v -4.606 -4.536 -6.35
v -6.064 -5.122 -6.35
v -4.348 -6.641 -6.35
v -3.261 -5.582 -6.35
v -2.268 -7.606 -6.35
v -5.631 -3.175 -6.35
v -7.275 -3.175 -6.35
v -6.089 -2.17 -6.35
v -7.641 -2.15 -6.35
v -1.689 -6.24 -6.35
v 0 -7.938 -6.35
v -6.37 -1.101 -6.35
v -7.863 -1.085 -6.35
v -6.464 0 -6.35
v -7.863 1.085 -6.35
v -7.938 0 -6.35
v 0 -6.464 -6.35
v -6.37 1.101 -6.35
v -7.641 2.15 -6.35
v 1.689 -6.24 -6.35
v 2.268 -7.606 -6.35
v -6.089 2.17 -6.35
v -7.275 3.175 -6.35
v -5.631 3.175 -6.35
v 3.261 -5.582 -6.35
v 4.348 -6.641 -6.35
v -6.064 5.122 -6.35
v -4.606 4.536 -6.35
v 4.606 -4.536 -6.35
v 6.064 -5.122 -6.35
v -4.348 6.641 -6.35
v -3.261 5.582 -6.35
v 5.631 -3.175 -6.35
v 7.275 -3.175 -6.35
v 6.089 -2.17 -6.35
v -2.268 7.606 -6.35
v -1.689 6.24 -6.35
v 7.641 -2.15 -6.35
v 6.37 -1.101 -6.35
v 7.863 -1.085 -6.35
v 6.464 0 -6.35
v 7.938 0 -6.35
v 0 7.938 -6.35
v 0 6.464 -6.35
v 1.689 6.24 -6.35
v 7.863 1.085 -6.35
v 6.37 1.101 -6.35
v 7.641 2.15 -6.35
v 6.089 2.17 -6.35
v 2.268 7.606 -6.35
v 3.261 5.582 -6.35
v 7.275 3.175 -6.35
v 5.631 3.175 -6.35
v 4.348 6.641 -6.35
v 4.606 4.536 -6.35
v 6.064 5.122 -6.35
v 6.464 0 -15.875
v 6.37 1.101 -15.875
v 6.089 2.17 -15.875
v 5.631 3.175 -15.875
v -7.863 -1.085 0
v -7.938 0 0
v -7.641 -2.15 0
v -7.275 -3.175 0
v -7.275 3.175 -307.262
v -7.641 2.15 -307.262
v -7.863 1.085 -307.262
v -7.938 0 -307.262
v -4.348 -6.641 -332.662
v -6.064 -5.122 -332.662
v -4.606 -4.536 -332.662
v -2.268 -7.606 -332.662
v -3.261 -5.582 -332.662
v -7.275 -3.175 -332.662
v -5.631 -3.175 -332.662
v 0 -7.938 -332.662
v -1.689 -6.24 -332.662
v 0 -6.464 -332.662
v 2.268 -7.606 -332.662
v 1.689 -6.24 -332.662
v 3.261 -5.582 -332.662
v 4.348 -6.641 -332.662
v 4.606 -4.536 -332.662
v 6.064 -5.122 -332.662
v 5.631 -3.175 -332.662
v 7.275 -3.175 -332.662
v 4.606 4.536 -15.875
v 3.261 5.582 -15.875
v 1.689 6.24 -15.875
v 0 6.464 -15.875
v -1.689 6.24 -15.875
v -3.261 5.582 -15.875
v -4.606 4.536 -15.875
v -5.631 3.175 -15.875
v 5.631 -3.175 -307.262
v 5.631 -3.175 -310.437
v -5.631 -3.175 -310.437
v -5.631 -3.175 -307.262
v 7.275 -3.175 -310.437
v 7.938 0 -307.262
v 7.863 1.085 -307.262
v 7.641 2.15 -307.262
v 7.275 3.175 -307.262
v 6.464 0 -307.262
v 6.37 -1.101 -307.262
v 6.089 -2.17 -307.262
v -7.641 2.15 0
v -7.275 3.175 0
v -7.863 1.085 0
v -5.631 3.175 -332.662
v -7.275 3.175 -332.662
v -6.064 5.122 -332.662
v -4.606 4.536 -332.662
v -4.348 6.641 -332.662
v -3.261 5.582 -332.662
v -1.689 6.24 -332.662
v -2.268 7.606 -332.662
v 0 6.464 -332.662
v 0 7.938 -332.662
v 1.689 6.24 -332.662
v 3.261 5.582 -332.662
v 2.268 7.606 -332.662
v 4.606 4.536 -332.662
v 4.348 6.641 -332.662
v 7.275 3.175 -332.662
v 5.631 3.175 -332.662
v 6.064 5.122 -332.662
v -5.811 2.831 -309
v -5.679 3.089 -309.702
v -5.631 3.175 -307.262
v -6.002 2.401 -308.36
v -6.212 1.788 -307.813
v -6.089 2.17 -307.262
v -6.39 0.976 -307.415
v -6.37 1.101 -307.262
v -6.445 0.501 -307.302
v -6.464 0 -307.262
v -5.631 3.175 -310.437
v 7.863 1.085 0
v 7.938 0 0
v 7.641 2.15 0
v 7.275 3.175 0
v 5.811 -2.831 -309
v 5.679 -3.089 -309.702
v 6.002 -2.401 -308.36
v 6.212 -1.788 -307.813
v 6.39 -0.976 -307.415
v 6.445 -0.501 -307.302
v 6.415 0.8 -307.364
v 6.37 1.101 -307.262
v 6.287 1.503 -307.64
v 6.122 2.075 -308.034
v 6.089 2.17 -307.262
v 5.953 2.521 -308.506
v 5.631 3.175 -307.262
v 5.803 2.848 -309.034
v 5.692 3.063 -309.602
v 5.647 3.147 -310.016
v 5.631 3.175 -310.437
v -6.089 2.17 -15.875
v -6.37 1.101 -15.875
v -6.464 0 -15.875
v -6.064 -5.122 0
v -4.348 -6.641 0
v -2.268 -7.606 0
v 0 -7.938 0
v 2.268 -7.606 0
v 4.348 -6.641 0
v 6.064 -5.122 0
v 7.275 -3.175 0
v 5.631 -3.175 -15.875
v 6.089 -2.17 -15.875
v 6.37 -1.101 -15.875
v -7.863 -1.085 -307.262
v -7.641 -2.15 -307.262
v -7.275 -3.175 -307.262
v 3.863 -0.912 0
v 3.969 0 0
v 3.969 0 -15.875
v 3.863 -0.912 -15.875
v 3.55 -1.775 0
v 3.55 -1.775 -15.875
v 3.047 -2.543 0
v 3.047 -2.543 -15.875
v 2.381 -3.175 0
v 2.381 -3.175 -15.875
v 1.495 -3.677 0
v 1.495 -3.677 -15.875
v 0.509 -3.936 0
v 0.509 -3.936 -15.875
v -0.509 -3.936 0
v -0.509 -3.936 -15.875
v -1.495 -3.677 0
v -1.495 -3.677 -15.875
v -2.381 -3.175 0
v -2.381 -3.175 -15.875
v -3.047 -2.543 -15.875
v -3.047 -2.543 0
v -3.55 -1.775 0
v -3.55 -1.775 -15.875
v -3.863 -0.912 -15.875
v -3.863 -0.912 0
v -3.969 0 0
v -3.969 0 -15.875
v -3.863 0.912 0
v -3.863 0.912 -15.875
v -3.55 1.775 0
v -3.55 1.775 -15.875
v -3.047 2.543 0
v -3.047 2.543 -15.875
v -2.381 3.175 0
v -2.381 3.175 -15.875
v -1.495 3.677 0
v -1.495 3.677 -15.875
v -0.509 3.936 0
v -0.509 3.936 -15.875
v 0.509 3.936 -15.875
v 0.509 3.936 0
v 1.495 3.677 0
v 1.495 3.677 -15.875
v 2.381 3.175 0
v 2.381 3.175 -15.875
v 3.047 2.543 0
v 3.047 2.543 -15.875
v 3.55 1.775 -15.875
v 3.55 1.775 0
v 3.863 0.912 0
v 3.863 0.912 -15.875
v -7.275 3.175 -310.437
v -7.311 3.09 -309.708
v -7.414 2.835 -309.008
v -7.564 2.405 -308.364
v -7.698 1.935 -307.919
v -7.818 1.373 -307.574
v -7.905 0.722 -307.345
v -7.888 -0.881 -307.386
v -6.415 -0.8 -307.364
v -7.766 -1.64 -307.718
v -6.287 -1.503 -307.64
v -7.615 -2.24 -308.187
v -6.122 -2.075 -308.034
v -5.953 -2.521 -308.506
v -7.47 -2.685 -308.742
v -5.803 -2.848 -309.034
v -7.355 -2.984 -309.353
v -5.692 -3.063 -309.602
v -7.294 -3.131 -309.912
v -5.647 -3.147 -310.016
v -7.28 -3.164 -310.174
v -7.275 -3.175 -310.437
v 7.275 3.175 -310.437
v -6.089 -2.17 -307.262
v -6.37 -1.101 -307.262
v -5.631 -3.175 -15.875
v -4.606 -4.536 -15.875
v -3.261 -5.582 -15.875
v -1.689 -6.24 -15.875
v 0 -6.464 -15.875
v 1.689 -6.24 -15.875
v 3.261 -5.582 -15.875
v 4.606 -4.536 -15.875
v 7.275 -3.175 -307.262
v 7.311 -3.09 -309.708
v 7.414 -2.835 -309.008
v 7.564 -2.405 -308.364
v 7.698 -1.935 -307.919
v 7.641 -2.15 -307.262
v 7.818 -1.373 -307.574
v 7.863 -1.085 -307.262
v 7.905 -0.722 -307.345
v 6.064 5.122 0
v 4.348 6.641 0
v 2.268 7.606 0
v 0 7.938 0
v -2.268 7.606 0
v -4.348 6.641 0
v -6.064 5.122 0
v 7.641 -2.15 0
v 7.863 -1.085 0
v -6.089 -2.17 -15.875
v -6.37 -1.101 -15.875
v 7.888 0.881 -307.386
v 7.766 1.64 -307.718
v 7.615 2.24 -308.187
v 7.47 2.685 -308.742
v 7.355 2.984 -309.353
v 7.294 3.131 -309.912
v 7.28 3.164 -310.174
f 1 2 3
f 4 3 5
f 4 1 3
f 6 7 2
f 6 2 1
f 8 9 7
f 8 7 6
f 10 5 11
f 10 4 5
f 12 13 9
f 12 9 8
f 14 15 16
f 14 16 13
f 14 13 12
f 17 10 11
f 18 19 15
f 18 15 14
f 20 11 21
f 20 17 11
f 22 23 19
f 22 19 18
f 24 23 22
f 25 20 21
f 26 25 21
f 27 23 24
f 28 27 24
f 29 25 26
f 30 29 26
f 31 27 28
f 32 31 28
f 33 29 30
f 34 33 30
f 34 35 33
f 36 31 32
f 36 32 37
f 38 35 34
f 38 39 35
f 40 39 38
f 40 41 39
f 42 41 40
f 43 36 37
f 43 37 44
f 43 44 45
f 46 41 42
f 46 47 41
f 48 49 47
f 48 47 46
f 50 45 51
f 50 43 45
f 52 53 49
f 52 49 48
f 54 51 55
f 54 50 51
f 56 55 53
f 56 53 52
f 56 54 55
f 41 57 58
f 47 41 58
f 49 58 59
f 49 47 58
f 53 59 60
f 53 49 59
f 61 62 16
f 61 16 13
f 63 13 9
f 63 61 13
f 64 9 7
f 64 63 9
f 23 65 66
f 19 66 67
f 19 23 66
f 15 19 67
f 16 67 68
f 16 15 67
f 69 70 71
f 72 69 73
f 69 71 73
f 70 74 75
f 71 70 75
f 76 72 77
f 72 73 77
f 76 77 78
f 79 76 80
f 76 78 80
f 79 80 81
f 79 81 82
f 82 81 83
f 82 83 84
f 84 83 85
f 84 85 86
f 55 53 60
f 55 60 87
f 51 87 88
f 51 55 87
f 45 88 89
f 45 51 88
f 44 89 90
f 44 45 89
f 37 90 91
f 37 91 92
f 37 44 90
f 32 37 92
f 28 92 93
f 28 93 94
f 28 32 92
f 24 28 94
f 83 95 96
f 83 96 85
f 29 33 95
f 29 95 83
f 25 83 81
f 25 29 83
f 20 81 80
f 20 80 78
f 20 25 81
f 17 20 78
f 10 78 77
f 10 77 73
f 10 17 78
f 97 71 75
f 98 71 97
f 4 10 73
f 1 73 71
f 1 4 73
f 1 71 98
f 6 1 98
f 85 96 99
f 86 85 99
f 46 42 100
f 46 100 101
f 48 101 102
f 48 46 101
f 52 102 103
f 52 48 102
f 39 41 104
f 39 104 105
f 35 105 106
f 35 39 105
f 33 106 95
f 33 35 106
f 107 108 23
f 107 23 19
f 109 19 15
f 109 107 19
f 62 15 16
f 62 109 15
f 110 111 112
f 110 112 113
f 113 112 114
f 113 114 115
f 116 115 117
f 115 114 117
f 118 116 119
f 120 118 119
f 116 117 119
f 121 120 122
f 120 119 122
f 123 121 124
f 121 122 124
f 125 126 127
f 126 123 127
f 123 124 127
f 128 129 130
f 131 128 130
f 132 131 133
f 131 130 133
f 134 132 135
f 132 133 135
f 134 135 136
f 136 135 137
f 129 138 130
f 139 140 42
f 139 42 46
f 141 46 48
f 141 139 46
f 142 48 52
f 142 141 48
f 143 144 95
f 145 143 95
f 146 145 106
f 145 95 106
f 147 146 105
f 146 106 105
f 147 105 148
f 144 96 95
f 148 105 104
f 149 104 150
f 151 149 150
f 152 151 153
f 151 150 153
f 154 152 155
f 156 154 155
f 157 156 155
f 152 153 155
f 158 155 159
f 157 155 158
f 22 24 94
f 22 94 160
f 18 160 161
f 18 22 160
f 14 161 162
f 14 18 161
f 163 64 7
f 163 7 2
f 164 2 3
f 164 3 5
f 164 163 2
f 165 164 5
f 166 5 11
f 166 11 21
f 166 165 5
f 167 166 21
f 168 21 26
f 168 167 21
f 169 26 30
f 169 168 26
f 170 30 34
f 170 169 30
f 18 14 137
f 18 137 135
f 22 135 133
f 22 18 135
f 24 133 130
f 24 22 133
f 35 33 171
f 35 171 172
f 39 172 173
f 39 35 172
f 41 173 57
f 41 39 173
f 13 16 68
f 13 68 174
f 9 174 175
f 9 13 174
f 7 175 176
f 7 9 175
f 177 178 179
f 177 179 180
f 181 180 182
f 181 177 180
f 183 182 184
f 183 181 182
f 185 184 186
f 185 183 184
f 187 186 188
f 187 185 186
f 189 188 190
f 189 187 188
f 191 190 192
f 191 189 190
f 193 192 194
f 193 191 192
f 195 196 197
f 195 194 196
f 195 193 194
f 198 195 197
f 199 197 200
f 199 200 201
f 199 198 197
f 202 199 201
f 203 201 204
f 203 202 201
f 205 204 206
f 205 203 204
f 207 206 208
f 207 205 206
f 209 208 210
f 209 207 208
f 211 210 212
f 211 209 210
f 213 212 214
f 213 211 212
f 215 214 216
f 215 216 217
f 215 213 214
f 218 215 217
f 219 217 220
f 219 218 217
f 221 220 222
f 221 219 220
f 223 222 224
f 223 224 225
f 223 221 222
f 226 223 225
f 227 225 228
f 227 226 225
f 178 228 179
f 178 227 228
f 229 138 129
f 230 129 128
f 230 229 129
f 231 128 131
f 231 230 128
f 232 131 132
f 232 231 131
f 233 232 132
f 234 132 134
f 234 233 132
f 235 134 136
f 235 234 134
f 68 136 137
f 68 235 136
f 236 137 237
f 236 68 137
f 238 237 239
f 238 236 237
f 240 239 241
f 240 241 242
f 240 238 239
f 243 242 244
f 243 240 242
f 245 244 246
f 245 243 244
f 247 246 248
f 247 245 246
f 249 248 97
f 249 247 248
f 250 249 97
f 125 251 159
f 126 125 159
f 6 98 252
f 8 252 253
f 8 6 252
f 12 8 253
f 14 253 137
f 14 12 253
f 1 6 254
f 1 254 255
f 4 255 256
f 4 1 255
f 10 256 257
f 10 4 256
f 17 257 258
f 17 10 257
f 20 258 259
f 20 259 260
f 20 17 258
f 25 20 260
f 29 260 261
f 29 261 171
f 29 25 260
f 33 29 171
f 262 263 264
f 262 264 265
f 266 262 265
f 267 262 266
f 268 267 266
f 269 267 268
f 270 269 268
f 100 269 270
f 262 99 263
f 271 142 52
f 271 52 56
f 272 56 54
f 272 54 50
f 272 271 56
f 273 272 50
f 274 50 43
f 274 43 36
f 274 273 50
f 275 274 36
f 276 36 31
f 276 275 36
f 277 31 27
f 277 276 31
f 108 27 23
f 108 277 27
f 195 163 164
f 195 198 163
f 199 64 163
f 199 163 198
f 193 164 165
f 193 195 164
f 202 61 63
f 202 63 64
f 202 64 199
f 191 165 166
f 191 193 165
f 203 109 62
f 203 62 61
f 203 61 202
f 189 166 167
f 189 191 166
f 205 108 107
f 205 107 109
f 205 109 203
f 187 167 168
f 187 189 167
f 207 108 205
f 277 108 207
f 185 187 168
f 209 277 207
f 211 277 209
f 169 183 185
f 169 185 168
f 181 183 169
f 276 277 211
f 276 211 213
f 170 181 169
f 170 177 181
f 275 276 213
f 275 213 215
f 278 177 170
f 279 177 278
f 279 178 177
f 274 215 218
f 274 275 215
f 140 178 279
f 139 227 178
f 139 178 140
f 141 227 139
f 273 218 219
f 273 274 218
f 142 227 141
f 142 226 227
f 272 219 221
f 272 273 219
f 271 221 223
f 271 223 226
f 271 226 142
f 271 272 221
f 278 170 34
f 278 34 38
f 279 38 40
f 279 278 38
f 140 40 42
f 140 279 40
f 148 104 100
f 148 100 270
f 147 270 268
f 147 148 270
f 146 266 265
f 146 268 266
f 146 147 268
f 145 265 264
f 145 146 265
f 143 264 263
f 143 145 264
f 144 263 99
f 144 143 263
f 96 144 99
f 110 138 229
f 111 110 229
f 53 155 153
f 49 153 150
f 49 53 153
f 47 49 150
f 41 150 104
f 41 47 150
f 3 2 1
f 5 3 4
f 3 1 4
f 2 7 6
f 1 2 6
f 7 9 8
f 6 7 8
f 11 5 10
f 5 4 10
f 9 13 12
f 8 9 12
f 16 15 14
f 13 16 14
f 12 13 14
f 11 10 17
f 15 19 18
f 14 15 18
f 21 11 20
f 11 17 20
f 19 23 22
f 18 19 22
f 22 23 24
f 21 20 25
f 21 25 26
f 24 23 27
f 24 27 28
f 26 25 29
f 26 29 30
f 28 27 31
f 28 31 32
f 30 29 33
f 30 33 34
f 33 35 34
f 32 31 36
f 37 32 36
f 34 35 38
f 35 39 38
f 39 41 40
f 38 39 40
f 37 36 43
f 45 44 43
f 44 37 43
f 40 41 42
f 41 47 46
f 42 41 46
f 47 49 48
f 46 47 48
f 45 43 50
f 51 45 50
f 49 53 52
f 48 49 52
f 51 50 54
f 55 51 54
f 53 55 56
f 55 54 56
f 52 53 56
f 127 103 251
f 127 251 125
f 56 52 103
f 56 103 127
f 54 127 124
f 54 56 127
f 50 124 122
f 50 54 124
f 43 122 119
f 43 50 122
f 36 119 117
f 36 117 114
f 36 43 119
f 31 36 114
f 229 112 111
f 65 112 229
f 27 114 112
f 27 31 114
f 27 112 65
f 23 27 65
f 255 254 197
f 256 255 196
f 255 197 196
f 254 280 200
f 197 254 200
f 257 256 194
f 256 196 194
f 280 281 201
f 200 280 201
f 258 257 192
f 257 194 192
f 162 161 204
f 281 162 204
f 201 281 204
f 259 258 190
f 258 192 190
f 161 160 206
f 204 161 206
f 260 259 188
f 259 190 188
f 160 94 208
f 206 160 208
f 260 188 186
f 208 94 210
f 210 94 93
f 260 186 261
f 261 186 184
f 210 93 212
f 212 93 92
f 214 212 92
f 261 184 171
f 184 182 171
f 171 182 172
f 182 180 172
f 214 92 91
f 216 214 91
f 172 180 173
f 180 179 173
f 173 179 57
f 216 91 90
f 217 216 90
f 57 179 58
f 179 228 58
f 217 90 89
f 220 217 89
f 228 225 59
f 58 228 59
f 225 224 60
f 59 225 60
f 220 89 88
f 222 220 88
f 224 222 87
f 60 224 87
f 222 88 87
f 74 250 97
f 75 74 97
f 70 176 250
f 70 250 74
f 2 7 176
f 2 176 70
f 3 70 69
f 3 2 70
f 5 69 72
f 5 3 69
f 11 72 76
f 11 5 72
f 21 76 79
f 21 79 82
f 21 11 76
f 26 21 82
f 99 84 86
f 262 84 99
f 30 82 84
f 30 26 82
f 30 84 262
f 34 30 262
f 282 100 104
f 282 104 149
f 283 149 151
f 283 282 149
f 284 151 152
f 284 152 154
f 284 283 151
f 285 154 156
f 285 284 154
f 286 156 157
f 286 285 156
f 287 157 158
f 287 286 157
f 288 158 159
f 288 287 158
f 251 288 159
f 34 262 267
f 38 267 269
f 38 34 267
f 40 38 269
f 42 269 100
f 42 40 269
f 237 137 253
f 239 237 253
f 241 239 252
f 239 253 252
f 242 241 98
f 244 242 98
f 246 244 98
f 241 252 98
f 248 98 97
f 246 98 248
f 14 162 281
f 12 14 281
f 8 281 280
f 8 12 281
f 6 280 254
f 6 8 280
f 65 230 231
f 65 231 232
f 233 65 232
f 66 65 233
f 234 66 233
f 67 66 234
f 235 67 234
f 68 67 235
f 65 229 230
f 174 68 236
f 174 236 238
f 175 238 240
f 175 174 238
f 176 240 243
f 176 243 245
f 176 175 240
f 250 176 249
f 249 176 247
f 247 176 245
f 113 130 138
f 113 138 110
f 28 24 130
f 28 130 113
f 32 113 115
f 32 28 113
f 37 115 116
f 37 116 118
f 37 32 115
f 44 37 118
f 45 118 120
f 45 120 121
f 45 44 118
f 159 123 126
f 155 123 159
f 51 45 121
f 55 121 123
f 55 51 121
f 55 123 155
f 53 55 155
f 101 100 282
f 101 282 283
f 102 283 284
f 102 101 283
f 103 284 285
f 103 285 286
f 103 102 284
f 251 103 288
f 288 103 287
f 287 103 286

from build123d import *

# Parameters (mm, degrees)
THREADED_INSERT_1_1_DEPTH = 6.35
THREADED_START            = -6.35
THREADED_INSERT_1_2_DEPTH = 9.525
A_ARM_START               = -6.35
A_ARM_TUBE_DEPTH          = 326.311725
APEX_START                = -307.261725
APEX_SLOT_DEPTH           = 25.4
FILLET1_R                 = 3.175


with BuildPart() as part:
    # Sketch1 → Threaded insert 1-1 (new body)
    with BuildSketch(Plane.XY):
        with BuildLine():
            ThreePointArc((-2.38125, 3.175), (0, 3.96875), (2.38125, 3.175))
            Line((2.38125, 3.175), (5.630856905, 3.175))
            ThreePointArc((5.630856905, 3.175), (0, 6.4643), (-5.630856905, 3.175))
            Line((-5.630856905, 3.175), (-2.38125, 3.175))
        make_face()
        with BuildLine():
            ThreePointArc((-5.630856905, 3.175), (0, 6.4643), (5.630856905, 3.175))
            Line((5.630856905, 3.175), (7.274838916, 3.175))
            ThreePointArc((7.274838916, 3.175), (0, 7.9375), (-7.274838916, 3.175))
            Line((-7.274838916, 3.175), (-5.630856905, 3.175))
        make_face()
        with BuildLine():
            ThreePointArc((2.38125, 3.175), (3.549757914, 1.774878957), (3.96875, 0))
            Line((3.96875, 0), (6.4643, 0))
            ThreePointArc((6.4643, 0), (6.252468424, 1.641283978), (5.630856905, 3.175))
            Line((5.630856905, 3.175), (2.38125, 3.175))
        make_face()
        with BuildLine():
            Line((-6.4643, 0), (-3.96875, 0))
            ThreePointArc((-3.96875, 0), (-3.549757914, 1.774878957), (-2.38125, 3.175))
            Line((-2.38125, 3.175), (-5.630856905, 3.175))
            ThreePointArc((-5.630856905, 3.175), (-6.252468424, 1.641283978), (-6.4643, 0))
        make_face()
        with BuildLine():
            ThreePointArc((5.630856905, 3.175), (6.252468424, 1.641283978), (6.4643, 0))
            Line((6.4643, 0), (7.9375, 0))
            ThreePointArc((7.9375, 0), (7.770068859, 1.621707797), (7.274838916, 3.175))
            Line((7.274838916, 3.175), (5.630856905, 3.175))
        make_face()
        with BuildLine():
            Line((-7.9375, 0), (-6.4643, 0))
            ThreePointArc((-6.4643, 0), (-6.252468424, 1.641283978), (-5.630856905, 3.175))
            Line((-5.630856905, 3.175), (-7.274838916, 3.175))
            ThreePointArc((-7.274838916, 3.175), (-7.770068859, 1.621707797), (-7.9375, 0))
        make_face()
        with BuildLine():
            Line((7.9375, 0), (6.4643, 0))
            ThreePointArc((6.4643, 0), (6.252468424, -1.641283978), (5.630856905, -3.175))
            Line((5.630856905, -3.175), (7.274838916, -3.175))
            ThreePointArc((7.274838916, -3.175), (7.770068859, -1.621707797), (7.9375, 0))
        make_face()
        with BuildLine():
            ThreePointArc((-5.630856905, -3.175), (-6.252468424, -1.641283978), (-6.4643, 0))
            Line((-6.4643, 0), (-7.9375, 0))
            ThreePointArc((-7.9375, 0), (-7.770068859, -1.621707797), (-7.274838916, -3.175))
            Line((-7.274838916, -3.175), (-5.630856905, -3.175))
        make_face()
        with BuildLine():
            Line((6.4643, 0), (3.96875, 0))
            ThreePointArc((3.96875, 0), (3.549757914, -1.774878957), (2.38125, -3.175))
            Line((2.38125, -3.175), (5.630856905, -3.175))
            ThreePointArc((5.630856905, -3.175), (6.252468424, -1.641283978), (6.4643, 0))
        make_face()
        with BuildLine():
            ThreePointArc((-2.38125, -3.175), (-3.549757914, -1.774878957), (-3.96875, 0))
            Line((-3.96875, 0), (-6.4643, 0))
            ThreePointArc((-6.4643, 0), (-6.252468424, -1.641283978), (-5.630856905, -3.175))
            Line((-5.630856905, -3.175), (-2.38125, -3.175))
        make_face()
        with BuildLine():
            Line((5.630856905, -3.175), (2.38125, -3.175))
            ThreePointArc((2.38125, -3.175), (0, -3.96875), (-2.38125, -3.175))
            Line((-2.38125, -3.175), (-5.630856905, -3.175))
            ThreePointArc((-5.630856905, -3.175), (0, -6.4643), (5.630856905, -3.175))
        make_face()
        with BuildLine():
            Line((7.274838916, -3.175), (5.630856905, -3.175))
            ThreePointArc((5.630856905, -3.175), (0, -6.4643), (-5.630856905, -3.175))
            Line((-5.630856905, -3.175), (-7.274838916, -3.175))
            ThreePointArc((-7.274838916, -3.175), (0, -7.9375), (7.274838916, -3.175))
        make_face()
    extrude(amount=-THREADED_INSERT_1_1_DEPTH)

    # Sketch1<3> → Threaded insert 1-2 (add)
    with BuildSketch(Plane.XY.offset(THREADED_START)):
        with BuildLine():
            ThreePointArc((-2.38125, 3.175), (0, 3.96875), (2.38125, 3.175))
            Line((2.38125, 3.175), (5.630856905, 3.175))
            ThreePointArc((5.630856905, 3.175), (0, 6.4643), (-5.630856905, 3.175))
            Line((-5.630856905, 3.175), (-2.38125, 3.175))
        make_face()
        with BuildLine():
            ThreePointArc((2.38125, 3.175), (3.549757914, 1.774878957), (3.96875, 0))
            Line((3.96875, 0), (6.4643, 0))
            ThreePointArc((6.4643, 0), (6.252468424, 1.641283978), (5.630856905, 3.175))
            Line((5.630856905, 3.175), (2.38125, 3.175))
        make_face()
        with BuildLine():
            Line((-6.4643, 0), (-3.96875, 0))
            ThreePointArc((-3.96875, 0), (-3.549757914, 1.774878957), (-2.38125, 3.175))
            Line((-2.38125, 3.175), (-5.630856905, 3.175))
            ThreePointArc((-5.630856905, 3.175), (-6.252468424, 1.641283978), (-6.4643, 0))
        make_face()
        with BuildLine():
            Line((6.4643, 0), (3.96875, 0))
            ThreePointArc((3.96875, 0), (3.549757914, -1.774878957), (2.38125, -3.175))
            Line((2.38125, -3.175), (5.630856905, -3.175))
            ThreePointArc((5.630856905, -3.175), (6.252468424, -1.641283978), (6.4643, 0))
        make_face()
        with BuildLine():
            ThreePointArc((-2.38125, -3.175), (-3.549757914, -1.774878957), (-3.96875, 0))
            Line((-3.96875, 0), (-6.4643, 0))
            ThreePointArc((-6.4643, 0), (-6.252468424, -1.641283978), (-5.630856905, -3.175))
            Line((-5.630856905, -3.175), (-2.38125, -3.175))
        make_face()
        with BuildLine():
            Line((5.630856905, -3.175), (2.38125, -3.175))
            ThreePointArc((2.38125, -3.175), (0, -3.96875), (-2.38125, -3.175))
            Line((-2.38125, -3.175), (-5.630856905, -3.175))
            ThreePointArc((-5.630856905, -3.175), (0, -6.4643), (5.630856905, -3.175))
        make_face()
    extrude(amount=-THREADED_INSERT_1_2_DEPTH)


with BuildPart() as body_2:
    # Sketch1<4> → A-arm tube (new body)
    with BuildSketch(Plane.XY.offset(A_ARM_START)):
        with BuildLine():
            ThreePointArc((-5.630856905, 3.175), (0, 6.4643), (5.630856905, 3.175))
            Line((5.630856905, 3.175), (7.274838916, 3.175))
            ThreePointArc((7.274838916, 3.175), (0, 7.9375), (-7.274838916, 3.175))
            Line((-7.274838916, 3.175), (-5.630856905, 3.175))
        make_face()
        with BuildLine():
            ThreePointArc((5.630856905, 3.175), (6.252468424, 1.641283978), (6.4643, 0))
            Line((6.4643, 0), (7.9375, 0))
            ThreePointArc((7.9375, 0), (7.770068859, 1.621707797), (7.274838916, 3.175))
            Line((7.274838916, 3.175), (5.630856905, 3.175))
        make_face()
        with BuildLine():
            Line((-7.9375, 0), (-6.4643, 0))
            ThreePointArc((-6.4643, 0), (-6.252468424, 1.641283978), (-5.630856905, 3.175))
            Line((-5.630856905, 3.175), (-7.274838916, 3.175))
            ThreePointArc((-7.274838916, 3.175), (-7.770068859, 1.621707797), (-7.9375, 0))
        make_face()
        with BuildLine():
            Line((7.9375, 0), (6.4643, 0))
            ThreePointArc((6.4643, 0), (6.252468424, -1.641283978), (5.630856905, -3.175))
            Line((5.630856905, -3.175), (7.274838916, -3.175))
            ThreePointArc((7.274838916, -3.175), (7.770068859, -1.621707797), (7.9375, 0))
        make_face()
        with BuildLine():
            ThreePointArc((-5.630856905, -3.175), (-6.252468424, -1.641283978), (-6.4643, 0))
            Line((-6.4643, 0), (-7.9375, 0))
            ThreePointArc((-7.9375, 0), (-7.770068859, -1.621707797), (-7.274838916, -3.175))
            Line((-7.274838916, -3.175), (-5.630856905, -3.175))
        make_face()
        with BuildLine():
            Line((7.274838916, -3.175), (5.630856905, -3.175))
            ThreePointArc((5.630856905, -3.175), (0, -6.4643), (-5.630856905, -3.175))
            Line((-5.630856905, -3.175), (-7.274838916, -3.175))
            ThreePointArc((-7.274838916, -3.175), (0, -7.9375), (7.274838916, -3.175))
        make_face()
    extrude(amount=-A_ARM_TUBE_DEPTH)

    # Sketch1<5> → Apex slot (cut)
    with BuildSketch(Plane.XY.offset(APEX_START)):
        with BuildLine():
            ThreePointArc((5.630856905, 3.175), (6.252468424, 1.641283978), (6.4643, 0))
            Line((6.4643, 0), (7.9375, 0))
            ThreePointArc((7.9375, 0), (7.770068859, 1.621707797), (7.274838916, 3.175))
            Line((7.274838916, 3.175), (5.630856905, 3.175))
        make_face()
        with BuildLine():
            Line((-7.9375, 0), (-6.4643, 0))
            ThreePointArc((-6.4643, 0), (-6.252468424, 1.641283978), (-5.630856905, 3.175))
            Line((-5.630856905, 3.175), (-7.274838916, 3.175))
            ThreePointArc((-7.274838916, 3.175), (-7.770068859, 1.621707797), (-7.9375, 0))
        make_face()
        with BuildLine():
            Line((7.9375, 0), (6.4643, 0))
            ThreePointArc((6.4643, 0), (6.252468424, -1.641283978), (5.630856905, -3.175))
            Line((5.630856905, -3.175), (7.274838916, -3.175))
            ThreePointArc((7.274838916, -3.175), (7.770068859, -1.621707797), (7.9375, 0))
        make_face()
        with BuildLine():
            ThreePointArc((-5.630856905, -3.175), (-6.252468424, -1.641283978), (-6.4643, 0))
            Line((-6.4643, 0), (-7.9375, 0))
            ThreePointArc((-7.9375, 0), (-7.770068859, -1.621707797), (-7.274838916, -3.175))
            Line((-7.274838916, -3.175), (-5.630856905, -3.175))
        make_face()
    extrude(amount=-APEX_SLOT_DEPTH, mode=Mode.SUBTRACT)

    # Fillet1
    # the kernel refuses this fillet: 3.175 mm, written as the material it adds along each edge
    with BuildSketch(Plane(origin=(2.306643095, 3.175, -307.261725), x_dir=(0, 0, -1), z_dir=(-1, 0, 0))) as fillet1_piece_1_section:
        with BuildLine():
            CenterArc((FILLET1_R, FILLET1_R), FILLET1_R, 180, 90)
            Line((0, FILLET1_R), (0, 0))
            Line((0, 0), (FILLET1_R, 0))
        make_face()
    fillet1_piece_1 = extrude(amount=17.51898201, mode=Mode.PRIVATE)
    fillet1_piece_1 = fillet1_piece_1 - Plane(origin=(0, 0, -307.98145762), x_dir=(-0.8710698614669244, 0.49115913555994567, 0), z_dir=(0, 0, 1)) * Cylinder(6.4643, 48, mode=Mode.PRIVATE)
    fillet1_piece_1 = fillet1_piece_1 & Plane(origin=(0, 0, -307.98145762), x_dir=(-1, 0, 0), z_dir=(0, 0, 1)) * Cylinder(7.9375, 48, mode=Mode.PRIVATE)
    add(fillet1_piece_1)
    with BuildSketch(Plane(origin=(-15.212338916, -3.175, -307.261725), x_dir=(0, 0, -1), z_dir=(1, 0, 0))) as fillet1_piece_2_section:
        with BuildLine():
            CenterArc((FILLET1_R, FILLET1_R), FILLET1_R, 180, 90)
            Line((0, FILLET1_R), (0, 0))
            Line((0, 0), (FILLET1_R, 0))
        make_face()
    fillet1_piece_2 = extrude(amount=17.51898201, mode=Mode.PRIVATE)
    fillet1_piece_2 = fillet1_piece_2 - Plane(origin=(0, 0, -307.981457783), x_dir=(-0.8710698614669244, 0.49115913555994567, 0), z_dir=(0, 0, 1)) * Cylinder(6.4643, 48, mode=Mode.PRIVATE)
    fillet1_piece_2 = fillet1_piece_2 & Plane(origin=(0, 0, -307.981457783), x_dir=(-1, 0, 0), z_dir=(0, 0, 1)) * Cylinder(7.9375, 48, mode=Mode.PRIVATE)
    add(fillet1_piece_2)
    with BuildSketch(Plane(origin=(-2.306643095, -3.175, -307.261725), x_dir=(0, 0, -1), z_dir=(1, 0, 0))) as fillet1_piece_3_section:
        with BuildLine():
            CenterArc((FILLET1_R, FILLET1_R), FILLET1_R, 180, 90)
            Line((0, FILLET1_R), (0, 0))
            Line((0, 0), (FILLET1_R, 0))
        make_face()
    fillet1_piece_3 = extrude(amount=17.51898201, mode=Mode.PRIVATE)
    fillet1_piece_3 = fillet1_piece_3 - Plane(origin=(0, 0, -307.98145762), x_dir=(-0.8710698614669244, 0.49115913555994567, 0), z_dir=(0, 0, 1)) * Cylinder(6.4643, 48, mode=Mode.PRIVATE)
    fillet1_piece_3 = fillet1_piece_3 & Plane(origin=(0, 0, -307.98145762), x_dir=(-1, 0, 0), z_dir=(0, 0, 1)) * Cylinder(7.9375, 48, mode=Mode.PRIVATE)
    add(fillet1_piece_3)
    with BuildSketch(Plane(origin=(15.212338916, 3.175, -307.261725), x_dir=(0, -1, 0), z_dir=(-1, 0, 0))) as fillet1_piece_4_section:
        with BuildLine():
            CenterArc((FILLET1_R, -FILLET1_R), FILLET1_R, 90, 90)
            Line((0, -FILLET1_R), (0, 0))
            Line((0, 0), (FILLET1_R, 0))
        make_face()
    fillet1_piece_4 = extrude(amount=17.51898201, mode=Mode.PRIVATE)
    fillet1_piece_4 = fillet1_piece_4 - Plane(origin=(0, 0, -307.981457609), x_dir=(-0.8710698614669244, 0.49115913555994567, 0), z_dir=(0, 0, 1)) * Cylinder(6.4643, 48, mode=Mode.PRIVATE)
    fillet1_piece_4 = fillet1_piece_4 & Plane(origin=(0, 0, -307.981457609), x_dir=(-1, 0, 0), z_dir=(0, 0, 1)) * Cylinder(7.9375, 48, mode=Mode.PRIVATE)
    add(fillet1_piece_4)


solid = Compound([part.part, body_2.part])
